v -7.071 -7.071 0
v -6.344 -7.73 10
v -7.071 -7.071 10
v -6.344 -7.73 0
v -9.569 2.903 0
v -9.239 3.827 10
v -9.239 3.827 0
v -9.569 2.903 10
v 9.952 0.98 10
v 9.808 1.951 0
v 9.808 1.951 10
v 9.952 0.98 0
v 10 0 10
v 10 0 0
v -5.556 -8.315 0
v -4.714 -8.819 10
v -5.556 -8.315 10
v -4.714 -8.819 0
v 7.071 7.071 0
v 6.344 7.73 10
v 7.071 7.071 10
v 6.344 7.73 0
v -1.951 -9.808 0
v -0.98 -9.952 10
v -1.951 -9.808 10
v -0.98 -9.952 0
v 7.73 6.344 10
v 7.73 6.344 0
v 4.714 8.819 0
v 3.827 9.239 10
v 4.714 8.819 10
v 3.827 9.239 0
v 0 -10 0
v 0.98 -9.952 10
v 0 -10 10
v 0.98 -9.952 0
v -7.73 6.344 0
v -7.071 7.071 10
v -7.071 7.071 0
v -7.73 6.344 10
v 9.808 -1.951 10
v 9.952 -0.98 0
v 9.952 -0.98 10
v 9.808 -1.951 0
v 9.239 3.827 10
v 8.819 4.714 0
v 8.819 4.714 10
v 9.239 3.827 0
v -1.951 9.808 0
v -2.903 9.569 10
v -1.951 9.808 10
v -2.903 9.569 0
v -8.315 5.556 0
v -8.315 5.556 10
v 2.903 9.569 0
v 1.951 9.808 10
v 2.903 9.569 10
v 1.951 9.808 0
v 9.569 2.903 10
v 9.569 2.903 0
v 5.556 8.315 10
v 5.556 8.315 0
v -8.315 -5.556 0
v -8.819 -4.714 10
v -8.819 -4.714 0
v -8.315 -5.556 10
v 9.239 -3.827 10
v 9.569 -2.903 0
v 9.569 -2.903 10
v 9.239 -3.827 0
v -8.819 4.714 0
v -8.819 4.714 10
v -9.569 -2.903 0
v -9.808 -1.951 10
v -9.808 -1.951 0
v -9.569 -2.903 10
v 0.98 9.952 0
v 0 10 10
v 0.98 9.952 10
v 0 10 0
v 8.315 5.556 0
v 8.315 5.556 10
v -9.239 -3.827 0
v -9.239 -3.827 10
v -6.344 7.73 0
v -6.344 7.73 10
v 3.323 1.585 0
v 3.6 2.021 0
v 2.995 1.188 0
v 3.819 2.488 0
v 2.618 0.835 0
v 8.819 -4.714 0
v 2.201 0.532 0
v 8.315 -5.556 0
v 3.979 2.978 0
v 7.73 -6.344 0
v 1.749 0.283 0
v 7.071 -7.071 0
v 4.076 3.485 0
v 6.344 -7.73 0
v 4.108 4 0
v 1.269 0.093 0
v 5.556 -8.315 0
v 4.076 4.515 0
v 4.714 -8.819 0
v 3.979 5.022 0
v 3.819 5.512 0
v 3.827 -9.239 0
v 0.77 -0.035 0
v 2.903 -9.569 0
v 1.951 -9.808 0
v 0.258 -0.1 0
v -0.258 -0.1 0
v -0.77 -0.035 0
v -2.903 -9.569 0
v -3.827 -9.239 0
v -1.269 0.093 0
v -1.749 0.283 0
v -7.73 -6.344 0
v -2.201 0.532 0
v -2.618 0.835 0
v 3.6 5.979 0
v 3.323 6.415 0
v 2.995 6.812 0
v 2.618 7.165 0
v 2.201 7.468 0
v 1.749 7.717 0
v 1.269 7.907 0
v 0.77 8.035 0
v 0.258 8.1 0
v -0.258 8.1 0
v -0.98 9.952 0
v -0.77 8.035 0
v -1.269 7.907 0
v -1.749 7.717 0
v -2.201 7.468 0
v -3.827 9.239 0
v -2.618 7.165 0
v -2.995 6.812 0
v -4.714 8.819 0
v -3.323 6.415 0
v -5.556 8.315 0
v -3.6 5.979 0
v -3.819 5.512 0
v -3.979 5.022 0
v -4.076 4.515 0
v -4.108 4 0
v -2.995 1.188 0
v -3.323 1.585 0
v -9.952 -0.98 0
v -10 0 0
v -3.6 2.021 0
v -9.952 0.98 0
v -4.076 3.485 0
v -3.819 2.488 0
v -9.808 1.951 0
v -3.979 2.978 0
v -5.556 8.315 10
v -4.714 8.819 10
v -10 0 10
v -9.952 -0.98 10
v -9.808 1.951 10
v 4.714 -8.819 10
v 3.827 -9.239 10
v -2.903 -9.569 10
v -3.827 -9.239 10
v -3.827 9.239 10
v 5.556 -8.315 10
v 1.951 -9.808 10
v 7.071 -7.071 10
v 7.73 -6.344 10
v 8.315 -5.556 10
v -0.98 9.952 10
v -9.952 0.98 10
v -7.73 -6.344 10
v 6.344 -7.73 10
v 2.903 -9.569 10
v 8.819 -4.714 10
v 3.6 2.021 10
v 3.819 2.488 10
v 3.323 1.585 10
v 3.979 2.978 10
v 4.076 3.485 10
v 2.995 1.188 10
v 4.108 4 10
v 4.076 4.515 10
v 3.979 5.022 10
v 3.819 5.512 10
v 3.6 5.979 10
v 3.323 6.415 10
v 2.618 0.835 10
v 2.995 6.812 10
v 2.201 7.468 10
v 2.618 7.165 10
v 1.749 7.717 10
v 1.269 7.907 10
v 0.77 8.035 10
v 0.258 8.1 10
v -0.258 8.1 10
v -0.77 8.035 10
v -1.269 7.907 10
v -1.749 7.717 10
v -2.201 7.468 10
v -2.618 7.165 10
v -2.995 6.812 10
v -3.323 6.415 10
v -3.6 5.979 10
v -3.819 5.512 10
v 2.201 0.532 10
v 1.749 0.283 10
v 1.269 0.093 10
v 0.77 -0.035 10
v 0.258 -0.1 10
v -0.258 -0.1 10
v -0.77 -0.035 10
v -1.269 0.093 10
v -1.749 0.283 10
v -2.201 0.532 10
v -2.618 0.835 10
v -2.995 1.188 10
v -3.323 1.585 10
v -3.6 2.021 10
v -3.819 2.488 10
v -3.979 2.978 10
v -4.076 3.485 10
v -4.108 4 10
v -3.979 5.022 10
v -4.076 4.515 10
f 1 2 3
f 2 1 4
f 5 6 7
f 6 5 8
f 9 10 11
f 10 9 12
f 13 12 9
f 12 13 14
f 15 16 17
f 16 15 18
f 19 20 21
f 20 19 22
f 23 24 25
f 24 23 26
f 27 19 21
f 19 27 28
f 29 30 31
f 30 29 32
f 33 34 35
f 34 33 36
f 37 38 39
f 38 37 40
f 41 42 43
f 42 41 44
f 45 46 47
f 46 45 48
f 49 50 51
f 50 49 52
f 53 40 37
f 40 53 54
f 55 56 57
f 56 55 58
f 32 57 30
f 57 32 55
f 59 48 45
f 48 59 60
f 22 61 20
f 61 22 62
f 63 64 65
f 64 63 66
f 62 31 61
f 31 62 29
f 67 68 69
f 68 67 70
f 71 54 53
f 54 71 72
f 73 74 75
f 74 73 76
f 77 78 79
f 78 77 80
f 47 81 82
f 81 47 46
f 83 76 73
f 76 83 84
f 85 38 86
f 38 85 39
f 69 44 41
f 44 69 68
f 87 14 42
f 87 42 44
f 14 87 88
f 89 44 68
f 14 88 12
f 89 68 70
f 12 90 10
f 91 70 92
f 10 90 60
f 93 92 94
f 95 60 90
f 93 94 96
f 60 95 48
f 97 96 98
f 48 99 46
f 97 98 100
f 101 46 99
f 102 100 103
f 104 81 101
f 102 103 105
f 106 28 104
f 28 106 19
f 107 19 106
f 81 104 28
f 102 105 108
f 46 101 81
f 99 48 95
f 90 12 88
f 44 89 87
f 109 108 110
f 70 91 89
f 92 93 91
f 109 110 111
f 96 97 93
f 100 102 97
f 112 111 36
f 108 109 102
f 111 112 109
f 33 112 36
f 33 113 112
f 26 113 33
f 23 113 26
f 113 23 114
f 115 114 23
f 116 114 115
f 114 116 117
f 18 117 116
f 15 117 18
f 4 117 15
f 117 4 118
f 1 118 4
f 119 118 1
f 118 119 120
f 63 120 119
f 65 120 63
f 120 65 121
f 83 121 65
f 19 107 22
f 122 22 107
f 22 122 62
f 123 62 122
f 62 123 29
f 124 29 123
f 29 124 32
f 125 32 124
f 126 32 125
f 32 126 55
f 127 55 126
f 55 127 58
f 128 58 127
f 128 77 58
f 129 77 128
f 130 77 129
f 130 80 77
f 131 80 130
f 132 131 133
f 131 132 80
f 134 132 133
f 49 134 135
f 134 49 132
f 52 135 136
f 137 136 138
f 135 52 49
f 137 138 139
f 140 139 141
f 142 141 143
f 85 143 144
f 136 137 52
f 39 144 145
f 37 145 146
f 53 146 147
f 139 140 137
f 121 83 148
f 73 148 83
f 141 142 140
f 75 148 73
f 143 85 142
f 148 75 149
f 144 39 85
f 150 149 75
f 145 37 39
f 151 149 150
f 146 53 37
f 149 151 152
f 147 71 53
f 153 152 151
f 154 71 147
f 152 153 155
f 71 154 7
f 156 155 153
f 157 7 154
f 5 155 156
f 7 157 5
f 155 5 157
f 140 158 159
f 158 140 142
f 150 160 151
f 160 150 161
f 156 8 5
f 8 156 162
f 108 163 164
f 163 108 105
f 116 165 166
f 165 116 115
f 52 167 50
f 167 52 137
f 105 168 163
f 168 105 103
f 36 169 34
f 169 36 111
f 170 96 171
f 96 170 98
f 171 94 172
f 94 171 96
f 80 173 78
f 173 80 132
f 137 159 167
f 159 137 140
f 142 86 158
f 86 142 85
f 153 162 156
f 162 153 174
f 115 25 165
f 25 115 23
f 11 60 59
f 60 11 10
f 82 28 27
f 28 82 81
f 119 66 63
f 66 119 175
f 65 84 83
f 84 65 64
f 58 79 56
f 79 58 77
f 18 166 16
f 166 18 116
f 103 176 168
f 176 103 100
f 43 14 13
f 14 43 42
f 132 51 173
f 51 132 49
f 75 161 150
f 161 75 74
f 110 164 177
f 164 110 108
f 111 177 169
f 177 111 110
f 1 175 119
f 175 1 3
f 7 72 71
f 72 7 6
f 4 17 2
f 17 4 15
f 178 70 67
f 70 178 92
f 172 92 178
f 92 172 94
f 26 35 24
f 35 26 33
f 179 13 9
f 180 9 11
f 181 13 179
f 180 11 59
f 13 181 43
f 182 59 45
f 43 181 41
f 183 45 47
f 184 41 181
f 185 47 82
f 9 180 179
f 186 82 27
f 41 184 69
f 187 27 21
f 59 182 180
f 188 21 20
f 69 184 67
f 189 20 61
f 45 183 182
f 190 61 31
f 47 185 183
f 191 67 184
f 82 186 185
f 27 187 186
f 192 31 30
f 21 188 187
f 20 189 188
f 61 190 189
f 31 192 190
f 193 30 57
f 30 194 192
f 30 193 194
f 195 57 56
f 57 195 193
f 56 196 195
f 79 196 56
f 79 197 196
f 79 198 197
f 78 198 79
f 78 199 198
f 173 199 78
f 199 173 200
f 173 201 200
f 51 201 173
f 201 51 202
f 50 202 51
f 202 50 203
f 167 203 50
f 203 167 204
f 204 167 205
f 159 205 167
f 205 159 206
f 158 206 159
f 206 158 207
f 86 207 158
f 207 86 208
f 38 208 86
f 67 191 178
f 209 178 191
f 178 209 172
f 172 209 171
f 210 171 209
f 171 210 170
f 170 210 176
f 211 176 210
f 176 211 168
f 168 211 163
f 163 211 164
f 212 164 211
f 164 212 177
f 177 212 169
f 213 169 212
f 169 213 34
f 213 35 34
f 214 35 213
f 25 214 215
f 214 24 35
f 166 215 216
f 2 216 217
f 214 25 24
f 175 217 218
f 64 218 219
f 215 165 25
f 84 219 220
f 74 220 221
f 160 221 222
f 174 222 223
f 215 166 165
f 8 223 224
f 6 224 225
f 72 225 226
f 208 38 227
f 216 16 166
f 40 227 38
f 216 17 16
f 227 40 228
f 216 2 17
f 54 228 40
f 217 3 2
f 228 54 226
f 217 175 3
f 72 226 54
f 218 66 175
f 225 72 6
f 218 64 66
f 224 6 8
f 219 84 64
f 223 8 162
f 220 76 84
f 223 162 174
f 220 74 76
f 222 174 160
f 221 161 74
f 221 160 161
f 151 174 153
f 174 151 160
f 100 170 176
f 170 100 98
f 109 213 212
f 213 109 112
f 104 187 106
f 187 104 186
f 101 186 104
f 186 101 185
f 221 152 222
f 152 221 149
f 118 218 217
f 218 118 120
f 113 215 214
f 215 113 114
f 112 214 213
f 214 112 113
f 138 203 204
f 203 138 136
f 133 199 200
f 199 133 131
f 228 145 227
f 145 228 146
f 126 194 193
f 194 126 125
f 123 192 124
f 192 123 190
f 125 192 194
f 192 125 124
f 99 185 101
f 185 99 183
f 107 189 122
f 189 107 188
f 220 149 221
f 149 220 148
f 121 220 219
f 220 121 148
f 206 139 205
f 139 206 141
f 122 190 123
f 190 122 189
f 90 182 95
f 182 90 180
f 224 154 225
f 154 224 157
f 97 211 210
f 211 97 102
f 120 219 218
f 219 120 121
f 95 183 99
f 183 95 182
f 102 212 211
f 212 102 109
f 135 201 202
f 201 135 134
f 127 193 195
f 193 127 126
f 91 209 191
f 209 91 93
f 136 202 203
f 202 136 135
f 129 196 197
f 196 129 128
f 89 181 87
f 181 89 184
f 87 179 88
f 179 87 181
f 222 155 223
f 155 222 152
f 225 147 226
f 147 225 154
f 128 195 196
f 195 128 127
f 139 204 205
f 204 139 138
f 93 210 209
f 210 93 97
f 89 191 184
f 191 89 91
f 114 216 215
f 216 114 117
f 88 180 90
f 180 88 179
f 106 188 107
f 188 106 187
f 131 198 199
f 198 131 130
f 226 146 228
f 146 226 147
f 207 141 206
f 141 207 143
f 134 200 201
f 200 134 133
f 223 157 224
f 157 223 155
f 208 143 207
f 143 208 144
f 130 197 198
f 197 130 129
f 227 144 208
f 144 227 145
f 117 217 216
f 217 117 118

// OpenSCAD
// file: myLibs.scad
pi= 3.14159265359;

module hole(diam, height, clearance= 0.1)
{
        fn= round(diam * pi / 0.5);
        cylinder(h= height, r=diam / 2 / cos(180 / fn) + clearance, $fn=fn);
}

module nutTrap(ffd, faces=6, height=1)
{
	cylinder(h= height, r=ffd / cos(180 / faces) / 2 + 0.05, $fn=faces);
}

// A slot which has rounded ends, but total length is l
module slot(d= 4, l= 8, ht= 1, clearance=0.1) {
	fn= round(d * pi / 0.5);
	rd= d / 2 / cos(180 / fn) + clearance;
	d1= rd*2;
	union() {
		translate([0,0,ht/2]) cube([l-d1, d1, ht], center=true);
		translate([-(l-d1)/2, 0, ht/2]) cylinder(h=ht, r=rd, $fn=fn, center=true); 
		translate([(l-d1)/2, 0, ht/2]) cylinder(h=ht, r=rd, $fn=fn, center=true); 
	}
	
}

/**
 * Standard right-angled triangle
 *
 * @param number o_len Lenght of the opposite side
 * @param number a_len Lenght of the adjacent side
 * @param number depth How wide/deep the triangle is in the 3rd dimension
 * @todo a better way ?
 */
module triangle(o_len, a_len, depth)
{
    linear_extrude(height=depth)
    {
        polygon(points=[[0,0],[a_len,0],[0,o_len]], paths=[[0,1,2]]);
    }
}
// main file
//
// an eccentric cam for adjusting the third wheel
//
use <myLibs.scad>

ht= 10;
difference() {
	cylinder(r=20/2, h=ht, $fn=64);
	translate([0,4,-1]) hole(8, ht+2);
}
